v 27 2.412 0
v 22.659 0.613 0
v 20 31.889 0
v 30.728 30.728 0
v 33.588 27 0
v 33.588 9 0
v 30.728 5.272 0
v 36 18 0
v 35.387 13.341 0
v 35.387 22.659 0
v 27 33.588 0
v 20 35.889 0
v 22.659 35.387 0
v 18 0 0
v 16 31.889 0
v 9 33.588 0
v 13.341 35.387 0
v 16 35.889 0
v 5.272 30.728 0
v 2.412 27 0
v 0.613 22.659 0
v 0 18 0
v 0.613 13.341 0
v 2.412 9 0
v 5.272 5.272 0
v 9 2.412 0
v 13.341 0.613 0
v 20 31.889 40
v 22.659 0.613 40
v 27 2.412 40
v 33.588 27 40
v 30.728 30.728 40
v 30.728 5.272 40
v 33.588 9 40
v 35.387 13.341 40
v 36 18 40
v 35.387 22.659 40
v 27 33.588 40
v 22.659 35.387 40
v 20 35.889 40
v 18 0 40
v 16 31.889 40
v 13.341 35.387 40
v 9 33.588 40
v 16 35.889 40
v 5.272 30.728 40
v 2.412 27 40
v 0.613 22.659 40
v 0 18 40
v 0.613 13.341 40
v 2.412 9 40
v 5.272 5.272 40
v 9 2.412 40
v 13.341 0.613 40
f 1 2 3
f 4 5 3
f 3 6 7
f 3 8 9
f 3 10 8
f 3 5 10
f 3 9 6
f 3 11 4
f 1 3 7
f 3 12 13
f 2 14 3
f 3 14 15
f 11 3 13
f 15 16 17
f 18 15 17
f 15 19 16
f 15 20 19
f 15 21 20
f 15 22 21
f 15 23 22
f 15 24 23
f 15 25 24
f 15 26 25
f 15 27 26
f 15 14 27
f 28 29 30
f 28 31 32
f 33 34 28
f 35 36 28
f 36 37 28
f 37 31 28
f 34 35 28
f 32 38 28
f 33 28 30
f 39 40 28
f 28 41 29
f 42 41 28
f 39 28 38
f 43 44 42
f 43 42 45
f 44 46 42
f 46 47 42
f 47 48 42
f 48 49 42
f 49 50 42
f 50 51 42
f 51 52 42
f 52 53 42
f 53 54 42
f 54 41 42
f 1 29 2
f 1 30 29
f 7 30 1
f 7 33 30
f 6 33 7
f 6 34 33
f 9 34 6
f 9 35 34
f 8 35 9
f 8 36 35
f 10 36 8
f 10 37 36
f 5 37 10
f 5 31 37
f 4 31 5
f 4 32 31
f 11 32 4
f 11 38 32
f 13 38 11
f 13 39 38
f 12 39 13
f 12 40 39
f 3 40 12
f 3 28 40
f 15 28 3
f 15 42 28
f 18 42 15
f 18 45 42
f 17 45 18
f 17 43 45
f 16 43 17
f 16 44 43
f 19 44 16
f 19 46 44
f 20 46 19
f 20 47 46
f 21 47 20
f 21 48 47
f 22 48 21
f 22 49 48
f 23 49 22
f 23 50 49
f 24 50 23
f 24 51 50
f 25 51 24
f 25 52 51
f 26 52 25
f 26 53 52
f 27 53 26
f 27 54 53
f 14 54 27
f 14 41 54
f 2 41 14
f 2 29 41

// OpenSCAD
$fn = 32;

// ----------------------------------------------------------------------
// Keyway shaft: d36 shaft, key 4 x 4 mm
// ----------------------------------------------------------------------

// --- parameters (mm) ---
shaft_r = 18;             // shaft radius
key_w = 4;                // keyway width
key_d = 4;                // keyway depth below the surface line
plate_t = 40;             // shaft length, Z (extrusion height)

shaft_d = 2 * shaft_r;  // shaft diameter
circle_step = 15;  // polygon sampling step, degrees

profile = [[13.341, 35.387], [9, 33.588], [5.272, 30.728], [2.412, 27], [0.613, 22.659], [0, 18], [0.613, 13.341], [2.412, 9], [5.272, 5.272], [9, 2.412], [13.341, 0.613], [18, 0], [22.659, 0.613], [27, 2.412], [30.728, 5.272], [33.588, 9], [35.387, 13.341], [36, 18], [35.387, 22.659], [33.588, 27], [30.728, 30.728], [27, 33.588], [22.659, 35.387], [20, 35.889], [20, 31.889], [16, 31.889], [16, 35.889]];  // primary outline, 27 points, counter clockwise

// --- the one profile operation ---
linear_extrude(height = plate_t) polygon(points = profile);
